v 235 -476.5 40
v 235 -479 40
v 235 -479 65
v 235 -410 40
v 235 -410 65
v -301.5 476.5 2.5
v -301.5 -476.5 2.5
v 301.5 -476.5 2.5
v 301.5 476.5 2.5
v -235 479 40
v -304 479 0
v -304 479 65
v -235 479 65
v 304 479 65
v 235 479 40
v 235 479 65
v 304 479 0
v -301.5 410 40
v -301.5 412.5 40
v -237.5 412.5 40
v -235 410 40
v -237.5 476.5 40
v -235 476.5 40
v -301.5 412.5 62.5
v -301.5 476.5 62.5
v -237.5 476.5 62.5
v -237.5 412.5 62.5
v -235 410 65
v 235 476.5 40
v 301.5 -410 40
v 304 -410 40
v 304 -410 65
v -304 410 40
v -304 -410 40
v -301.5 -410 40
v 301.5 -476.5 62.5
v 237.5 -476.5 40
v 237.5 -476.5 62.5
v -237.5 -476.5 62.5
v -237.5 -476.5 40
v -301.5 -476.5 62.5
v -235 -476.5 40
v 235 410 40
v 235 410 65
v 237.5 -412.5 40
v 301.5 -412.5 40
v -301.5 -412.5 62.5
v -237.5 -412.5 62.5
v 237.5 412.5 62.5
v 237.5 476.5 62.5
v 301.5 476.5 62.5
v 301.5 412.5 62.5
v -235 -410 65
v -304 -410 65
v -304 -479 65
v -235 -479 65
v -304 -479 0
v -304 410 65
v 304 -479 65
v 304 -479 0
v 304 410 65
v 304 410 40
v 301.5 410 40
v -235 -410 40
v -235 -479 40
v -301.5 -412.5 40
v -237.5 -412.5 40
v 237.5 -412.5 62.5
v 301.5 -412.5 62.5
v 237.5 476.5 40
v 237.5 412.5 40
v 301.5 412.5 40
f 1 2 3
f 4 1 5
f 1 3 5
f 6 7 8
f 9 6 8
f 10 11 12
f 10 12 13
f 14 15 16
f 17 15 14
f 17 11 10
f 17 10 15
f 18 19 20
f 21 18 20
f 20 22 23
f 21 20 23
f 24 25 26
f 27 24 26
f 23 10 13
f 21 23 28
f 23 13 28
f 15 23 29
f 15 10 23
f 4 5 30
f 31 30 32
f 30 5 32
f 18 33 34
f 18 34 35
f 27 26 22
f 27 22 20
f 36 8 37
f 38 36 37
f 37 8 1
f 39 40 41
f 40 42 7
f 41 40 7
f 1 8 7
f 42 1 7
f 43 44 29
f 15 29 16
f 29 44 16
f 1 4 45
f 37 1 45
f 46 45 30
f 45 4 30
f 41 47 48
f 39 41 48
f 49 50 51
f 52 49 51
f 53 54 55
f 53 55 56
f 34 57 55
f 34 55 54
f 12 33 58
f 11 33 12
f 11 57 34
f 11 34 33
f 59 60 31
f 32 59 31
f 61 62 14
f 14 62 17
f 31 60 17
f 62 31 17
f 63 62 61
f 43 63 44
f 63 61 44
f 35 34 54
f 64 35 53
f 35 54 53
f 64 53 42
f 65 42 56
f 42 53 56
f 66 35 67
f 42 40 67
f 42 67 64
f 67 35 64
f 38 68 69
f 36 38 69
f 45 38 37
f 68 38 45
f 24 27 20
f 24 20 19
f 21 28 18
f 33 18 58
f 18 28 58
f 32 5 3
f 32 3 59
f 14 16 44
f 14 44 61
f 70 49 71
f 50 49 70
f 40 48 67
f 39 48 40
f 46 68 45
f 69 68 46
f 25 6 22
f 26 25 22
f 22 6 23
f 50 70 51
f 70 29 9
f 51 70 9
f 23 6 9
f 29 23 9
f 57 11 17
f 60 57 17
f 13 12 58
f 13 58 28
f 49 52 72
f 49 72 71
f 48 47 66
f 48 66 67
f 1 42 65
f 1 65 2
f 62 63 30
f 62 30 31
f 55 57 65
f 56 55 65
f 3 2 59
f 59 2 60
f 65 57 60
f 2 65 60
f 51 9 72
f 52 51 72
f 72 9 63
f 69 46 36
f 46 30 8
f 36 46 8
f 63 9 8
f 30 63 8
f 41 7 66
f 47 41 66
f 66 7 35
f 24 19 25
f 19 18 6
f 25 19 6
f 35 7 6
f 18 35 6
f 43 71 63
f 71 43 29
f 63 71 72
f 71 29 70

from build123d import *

# Parameters (mm, degrees)
F0_W     = 608
F0_H     = 958
F1_DEPTH = 65
F3_DEPTH = 25
F4_T     = -2.5


# Not quite as in the source:
# - a shell that OpenCascade refuses in one call is made with other operations: the cavity is built on its own and cut out


with BuildPart() as f1:
    # F0 (on Top) → F1 (new body)
    with BuildSketch(Plane.XY):
        Rectangle(F0_W, F0_H)
    extrude(amount=F1_DEPTH)

    # F2 (on face) → F3 (cut)
    with BuildSketch(Plane.XY.offset(65)):
        Polygon((235, 533.0333780003), (-235, 533.0333780003), (-235, 410), (-362.3474363838, 410), (-362.3474363838, -410), (-235, -410), (-235, -557.4594508362), (235, -557.4594508362), (235, -410), (358.7432372559, -410), (358.7432372559, 410), (235, 410), align=None)
    extrude(amount=-F3_DEPTH, mode=Mode.SUBTRACT)

    # F4: a shell. OpenCascade refuses it in one call, so the cavity is built on its own and cut out:
    # the body offset inwards by the wall thickness, plus a prism from it out through each open face.
    f4_core = offset(f1.part, amount=F4_T, kind=Kind.INTERSECTION, mode=Mode.PRIVATE)
    f4_exits = [f4_core.faces().sort_by_distance(p)[0] for p in [
        (0, 0, 37.5),
    ]]
    add(f4_core, mode=Mode.SUBTRACT)
    extrude(f4_exits, amount=-F4_T, mode=Mode.SUBTRACT)


solid = f1.part
